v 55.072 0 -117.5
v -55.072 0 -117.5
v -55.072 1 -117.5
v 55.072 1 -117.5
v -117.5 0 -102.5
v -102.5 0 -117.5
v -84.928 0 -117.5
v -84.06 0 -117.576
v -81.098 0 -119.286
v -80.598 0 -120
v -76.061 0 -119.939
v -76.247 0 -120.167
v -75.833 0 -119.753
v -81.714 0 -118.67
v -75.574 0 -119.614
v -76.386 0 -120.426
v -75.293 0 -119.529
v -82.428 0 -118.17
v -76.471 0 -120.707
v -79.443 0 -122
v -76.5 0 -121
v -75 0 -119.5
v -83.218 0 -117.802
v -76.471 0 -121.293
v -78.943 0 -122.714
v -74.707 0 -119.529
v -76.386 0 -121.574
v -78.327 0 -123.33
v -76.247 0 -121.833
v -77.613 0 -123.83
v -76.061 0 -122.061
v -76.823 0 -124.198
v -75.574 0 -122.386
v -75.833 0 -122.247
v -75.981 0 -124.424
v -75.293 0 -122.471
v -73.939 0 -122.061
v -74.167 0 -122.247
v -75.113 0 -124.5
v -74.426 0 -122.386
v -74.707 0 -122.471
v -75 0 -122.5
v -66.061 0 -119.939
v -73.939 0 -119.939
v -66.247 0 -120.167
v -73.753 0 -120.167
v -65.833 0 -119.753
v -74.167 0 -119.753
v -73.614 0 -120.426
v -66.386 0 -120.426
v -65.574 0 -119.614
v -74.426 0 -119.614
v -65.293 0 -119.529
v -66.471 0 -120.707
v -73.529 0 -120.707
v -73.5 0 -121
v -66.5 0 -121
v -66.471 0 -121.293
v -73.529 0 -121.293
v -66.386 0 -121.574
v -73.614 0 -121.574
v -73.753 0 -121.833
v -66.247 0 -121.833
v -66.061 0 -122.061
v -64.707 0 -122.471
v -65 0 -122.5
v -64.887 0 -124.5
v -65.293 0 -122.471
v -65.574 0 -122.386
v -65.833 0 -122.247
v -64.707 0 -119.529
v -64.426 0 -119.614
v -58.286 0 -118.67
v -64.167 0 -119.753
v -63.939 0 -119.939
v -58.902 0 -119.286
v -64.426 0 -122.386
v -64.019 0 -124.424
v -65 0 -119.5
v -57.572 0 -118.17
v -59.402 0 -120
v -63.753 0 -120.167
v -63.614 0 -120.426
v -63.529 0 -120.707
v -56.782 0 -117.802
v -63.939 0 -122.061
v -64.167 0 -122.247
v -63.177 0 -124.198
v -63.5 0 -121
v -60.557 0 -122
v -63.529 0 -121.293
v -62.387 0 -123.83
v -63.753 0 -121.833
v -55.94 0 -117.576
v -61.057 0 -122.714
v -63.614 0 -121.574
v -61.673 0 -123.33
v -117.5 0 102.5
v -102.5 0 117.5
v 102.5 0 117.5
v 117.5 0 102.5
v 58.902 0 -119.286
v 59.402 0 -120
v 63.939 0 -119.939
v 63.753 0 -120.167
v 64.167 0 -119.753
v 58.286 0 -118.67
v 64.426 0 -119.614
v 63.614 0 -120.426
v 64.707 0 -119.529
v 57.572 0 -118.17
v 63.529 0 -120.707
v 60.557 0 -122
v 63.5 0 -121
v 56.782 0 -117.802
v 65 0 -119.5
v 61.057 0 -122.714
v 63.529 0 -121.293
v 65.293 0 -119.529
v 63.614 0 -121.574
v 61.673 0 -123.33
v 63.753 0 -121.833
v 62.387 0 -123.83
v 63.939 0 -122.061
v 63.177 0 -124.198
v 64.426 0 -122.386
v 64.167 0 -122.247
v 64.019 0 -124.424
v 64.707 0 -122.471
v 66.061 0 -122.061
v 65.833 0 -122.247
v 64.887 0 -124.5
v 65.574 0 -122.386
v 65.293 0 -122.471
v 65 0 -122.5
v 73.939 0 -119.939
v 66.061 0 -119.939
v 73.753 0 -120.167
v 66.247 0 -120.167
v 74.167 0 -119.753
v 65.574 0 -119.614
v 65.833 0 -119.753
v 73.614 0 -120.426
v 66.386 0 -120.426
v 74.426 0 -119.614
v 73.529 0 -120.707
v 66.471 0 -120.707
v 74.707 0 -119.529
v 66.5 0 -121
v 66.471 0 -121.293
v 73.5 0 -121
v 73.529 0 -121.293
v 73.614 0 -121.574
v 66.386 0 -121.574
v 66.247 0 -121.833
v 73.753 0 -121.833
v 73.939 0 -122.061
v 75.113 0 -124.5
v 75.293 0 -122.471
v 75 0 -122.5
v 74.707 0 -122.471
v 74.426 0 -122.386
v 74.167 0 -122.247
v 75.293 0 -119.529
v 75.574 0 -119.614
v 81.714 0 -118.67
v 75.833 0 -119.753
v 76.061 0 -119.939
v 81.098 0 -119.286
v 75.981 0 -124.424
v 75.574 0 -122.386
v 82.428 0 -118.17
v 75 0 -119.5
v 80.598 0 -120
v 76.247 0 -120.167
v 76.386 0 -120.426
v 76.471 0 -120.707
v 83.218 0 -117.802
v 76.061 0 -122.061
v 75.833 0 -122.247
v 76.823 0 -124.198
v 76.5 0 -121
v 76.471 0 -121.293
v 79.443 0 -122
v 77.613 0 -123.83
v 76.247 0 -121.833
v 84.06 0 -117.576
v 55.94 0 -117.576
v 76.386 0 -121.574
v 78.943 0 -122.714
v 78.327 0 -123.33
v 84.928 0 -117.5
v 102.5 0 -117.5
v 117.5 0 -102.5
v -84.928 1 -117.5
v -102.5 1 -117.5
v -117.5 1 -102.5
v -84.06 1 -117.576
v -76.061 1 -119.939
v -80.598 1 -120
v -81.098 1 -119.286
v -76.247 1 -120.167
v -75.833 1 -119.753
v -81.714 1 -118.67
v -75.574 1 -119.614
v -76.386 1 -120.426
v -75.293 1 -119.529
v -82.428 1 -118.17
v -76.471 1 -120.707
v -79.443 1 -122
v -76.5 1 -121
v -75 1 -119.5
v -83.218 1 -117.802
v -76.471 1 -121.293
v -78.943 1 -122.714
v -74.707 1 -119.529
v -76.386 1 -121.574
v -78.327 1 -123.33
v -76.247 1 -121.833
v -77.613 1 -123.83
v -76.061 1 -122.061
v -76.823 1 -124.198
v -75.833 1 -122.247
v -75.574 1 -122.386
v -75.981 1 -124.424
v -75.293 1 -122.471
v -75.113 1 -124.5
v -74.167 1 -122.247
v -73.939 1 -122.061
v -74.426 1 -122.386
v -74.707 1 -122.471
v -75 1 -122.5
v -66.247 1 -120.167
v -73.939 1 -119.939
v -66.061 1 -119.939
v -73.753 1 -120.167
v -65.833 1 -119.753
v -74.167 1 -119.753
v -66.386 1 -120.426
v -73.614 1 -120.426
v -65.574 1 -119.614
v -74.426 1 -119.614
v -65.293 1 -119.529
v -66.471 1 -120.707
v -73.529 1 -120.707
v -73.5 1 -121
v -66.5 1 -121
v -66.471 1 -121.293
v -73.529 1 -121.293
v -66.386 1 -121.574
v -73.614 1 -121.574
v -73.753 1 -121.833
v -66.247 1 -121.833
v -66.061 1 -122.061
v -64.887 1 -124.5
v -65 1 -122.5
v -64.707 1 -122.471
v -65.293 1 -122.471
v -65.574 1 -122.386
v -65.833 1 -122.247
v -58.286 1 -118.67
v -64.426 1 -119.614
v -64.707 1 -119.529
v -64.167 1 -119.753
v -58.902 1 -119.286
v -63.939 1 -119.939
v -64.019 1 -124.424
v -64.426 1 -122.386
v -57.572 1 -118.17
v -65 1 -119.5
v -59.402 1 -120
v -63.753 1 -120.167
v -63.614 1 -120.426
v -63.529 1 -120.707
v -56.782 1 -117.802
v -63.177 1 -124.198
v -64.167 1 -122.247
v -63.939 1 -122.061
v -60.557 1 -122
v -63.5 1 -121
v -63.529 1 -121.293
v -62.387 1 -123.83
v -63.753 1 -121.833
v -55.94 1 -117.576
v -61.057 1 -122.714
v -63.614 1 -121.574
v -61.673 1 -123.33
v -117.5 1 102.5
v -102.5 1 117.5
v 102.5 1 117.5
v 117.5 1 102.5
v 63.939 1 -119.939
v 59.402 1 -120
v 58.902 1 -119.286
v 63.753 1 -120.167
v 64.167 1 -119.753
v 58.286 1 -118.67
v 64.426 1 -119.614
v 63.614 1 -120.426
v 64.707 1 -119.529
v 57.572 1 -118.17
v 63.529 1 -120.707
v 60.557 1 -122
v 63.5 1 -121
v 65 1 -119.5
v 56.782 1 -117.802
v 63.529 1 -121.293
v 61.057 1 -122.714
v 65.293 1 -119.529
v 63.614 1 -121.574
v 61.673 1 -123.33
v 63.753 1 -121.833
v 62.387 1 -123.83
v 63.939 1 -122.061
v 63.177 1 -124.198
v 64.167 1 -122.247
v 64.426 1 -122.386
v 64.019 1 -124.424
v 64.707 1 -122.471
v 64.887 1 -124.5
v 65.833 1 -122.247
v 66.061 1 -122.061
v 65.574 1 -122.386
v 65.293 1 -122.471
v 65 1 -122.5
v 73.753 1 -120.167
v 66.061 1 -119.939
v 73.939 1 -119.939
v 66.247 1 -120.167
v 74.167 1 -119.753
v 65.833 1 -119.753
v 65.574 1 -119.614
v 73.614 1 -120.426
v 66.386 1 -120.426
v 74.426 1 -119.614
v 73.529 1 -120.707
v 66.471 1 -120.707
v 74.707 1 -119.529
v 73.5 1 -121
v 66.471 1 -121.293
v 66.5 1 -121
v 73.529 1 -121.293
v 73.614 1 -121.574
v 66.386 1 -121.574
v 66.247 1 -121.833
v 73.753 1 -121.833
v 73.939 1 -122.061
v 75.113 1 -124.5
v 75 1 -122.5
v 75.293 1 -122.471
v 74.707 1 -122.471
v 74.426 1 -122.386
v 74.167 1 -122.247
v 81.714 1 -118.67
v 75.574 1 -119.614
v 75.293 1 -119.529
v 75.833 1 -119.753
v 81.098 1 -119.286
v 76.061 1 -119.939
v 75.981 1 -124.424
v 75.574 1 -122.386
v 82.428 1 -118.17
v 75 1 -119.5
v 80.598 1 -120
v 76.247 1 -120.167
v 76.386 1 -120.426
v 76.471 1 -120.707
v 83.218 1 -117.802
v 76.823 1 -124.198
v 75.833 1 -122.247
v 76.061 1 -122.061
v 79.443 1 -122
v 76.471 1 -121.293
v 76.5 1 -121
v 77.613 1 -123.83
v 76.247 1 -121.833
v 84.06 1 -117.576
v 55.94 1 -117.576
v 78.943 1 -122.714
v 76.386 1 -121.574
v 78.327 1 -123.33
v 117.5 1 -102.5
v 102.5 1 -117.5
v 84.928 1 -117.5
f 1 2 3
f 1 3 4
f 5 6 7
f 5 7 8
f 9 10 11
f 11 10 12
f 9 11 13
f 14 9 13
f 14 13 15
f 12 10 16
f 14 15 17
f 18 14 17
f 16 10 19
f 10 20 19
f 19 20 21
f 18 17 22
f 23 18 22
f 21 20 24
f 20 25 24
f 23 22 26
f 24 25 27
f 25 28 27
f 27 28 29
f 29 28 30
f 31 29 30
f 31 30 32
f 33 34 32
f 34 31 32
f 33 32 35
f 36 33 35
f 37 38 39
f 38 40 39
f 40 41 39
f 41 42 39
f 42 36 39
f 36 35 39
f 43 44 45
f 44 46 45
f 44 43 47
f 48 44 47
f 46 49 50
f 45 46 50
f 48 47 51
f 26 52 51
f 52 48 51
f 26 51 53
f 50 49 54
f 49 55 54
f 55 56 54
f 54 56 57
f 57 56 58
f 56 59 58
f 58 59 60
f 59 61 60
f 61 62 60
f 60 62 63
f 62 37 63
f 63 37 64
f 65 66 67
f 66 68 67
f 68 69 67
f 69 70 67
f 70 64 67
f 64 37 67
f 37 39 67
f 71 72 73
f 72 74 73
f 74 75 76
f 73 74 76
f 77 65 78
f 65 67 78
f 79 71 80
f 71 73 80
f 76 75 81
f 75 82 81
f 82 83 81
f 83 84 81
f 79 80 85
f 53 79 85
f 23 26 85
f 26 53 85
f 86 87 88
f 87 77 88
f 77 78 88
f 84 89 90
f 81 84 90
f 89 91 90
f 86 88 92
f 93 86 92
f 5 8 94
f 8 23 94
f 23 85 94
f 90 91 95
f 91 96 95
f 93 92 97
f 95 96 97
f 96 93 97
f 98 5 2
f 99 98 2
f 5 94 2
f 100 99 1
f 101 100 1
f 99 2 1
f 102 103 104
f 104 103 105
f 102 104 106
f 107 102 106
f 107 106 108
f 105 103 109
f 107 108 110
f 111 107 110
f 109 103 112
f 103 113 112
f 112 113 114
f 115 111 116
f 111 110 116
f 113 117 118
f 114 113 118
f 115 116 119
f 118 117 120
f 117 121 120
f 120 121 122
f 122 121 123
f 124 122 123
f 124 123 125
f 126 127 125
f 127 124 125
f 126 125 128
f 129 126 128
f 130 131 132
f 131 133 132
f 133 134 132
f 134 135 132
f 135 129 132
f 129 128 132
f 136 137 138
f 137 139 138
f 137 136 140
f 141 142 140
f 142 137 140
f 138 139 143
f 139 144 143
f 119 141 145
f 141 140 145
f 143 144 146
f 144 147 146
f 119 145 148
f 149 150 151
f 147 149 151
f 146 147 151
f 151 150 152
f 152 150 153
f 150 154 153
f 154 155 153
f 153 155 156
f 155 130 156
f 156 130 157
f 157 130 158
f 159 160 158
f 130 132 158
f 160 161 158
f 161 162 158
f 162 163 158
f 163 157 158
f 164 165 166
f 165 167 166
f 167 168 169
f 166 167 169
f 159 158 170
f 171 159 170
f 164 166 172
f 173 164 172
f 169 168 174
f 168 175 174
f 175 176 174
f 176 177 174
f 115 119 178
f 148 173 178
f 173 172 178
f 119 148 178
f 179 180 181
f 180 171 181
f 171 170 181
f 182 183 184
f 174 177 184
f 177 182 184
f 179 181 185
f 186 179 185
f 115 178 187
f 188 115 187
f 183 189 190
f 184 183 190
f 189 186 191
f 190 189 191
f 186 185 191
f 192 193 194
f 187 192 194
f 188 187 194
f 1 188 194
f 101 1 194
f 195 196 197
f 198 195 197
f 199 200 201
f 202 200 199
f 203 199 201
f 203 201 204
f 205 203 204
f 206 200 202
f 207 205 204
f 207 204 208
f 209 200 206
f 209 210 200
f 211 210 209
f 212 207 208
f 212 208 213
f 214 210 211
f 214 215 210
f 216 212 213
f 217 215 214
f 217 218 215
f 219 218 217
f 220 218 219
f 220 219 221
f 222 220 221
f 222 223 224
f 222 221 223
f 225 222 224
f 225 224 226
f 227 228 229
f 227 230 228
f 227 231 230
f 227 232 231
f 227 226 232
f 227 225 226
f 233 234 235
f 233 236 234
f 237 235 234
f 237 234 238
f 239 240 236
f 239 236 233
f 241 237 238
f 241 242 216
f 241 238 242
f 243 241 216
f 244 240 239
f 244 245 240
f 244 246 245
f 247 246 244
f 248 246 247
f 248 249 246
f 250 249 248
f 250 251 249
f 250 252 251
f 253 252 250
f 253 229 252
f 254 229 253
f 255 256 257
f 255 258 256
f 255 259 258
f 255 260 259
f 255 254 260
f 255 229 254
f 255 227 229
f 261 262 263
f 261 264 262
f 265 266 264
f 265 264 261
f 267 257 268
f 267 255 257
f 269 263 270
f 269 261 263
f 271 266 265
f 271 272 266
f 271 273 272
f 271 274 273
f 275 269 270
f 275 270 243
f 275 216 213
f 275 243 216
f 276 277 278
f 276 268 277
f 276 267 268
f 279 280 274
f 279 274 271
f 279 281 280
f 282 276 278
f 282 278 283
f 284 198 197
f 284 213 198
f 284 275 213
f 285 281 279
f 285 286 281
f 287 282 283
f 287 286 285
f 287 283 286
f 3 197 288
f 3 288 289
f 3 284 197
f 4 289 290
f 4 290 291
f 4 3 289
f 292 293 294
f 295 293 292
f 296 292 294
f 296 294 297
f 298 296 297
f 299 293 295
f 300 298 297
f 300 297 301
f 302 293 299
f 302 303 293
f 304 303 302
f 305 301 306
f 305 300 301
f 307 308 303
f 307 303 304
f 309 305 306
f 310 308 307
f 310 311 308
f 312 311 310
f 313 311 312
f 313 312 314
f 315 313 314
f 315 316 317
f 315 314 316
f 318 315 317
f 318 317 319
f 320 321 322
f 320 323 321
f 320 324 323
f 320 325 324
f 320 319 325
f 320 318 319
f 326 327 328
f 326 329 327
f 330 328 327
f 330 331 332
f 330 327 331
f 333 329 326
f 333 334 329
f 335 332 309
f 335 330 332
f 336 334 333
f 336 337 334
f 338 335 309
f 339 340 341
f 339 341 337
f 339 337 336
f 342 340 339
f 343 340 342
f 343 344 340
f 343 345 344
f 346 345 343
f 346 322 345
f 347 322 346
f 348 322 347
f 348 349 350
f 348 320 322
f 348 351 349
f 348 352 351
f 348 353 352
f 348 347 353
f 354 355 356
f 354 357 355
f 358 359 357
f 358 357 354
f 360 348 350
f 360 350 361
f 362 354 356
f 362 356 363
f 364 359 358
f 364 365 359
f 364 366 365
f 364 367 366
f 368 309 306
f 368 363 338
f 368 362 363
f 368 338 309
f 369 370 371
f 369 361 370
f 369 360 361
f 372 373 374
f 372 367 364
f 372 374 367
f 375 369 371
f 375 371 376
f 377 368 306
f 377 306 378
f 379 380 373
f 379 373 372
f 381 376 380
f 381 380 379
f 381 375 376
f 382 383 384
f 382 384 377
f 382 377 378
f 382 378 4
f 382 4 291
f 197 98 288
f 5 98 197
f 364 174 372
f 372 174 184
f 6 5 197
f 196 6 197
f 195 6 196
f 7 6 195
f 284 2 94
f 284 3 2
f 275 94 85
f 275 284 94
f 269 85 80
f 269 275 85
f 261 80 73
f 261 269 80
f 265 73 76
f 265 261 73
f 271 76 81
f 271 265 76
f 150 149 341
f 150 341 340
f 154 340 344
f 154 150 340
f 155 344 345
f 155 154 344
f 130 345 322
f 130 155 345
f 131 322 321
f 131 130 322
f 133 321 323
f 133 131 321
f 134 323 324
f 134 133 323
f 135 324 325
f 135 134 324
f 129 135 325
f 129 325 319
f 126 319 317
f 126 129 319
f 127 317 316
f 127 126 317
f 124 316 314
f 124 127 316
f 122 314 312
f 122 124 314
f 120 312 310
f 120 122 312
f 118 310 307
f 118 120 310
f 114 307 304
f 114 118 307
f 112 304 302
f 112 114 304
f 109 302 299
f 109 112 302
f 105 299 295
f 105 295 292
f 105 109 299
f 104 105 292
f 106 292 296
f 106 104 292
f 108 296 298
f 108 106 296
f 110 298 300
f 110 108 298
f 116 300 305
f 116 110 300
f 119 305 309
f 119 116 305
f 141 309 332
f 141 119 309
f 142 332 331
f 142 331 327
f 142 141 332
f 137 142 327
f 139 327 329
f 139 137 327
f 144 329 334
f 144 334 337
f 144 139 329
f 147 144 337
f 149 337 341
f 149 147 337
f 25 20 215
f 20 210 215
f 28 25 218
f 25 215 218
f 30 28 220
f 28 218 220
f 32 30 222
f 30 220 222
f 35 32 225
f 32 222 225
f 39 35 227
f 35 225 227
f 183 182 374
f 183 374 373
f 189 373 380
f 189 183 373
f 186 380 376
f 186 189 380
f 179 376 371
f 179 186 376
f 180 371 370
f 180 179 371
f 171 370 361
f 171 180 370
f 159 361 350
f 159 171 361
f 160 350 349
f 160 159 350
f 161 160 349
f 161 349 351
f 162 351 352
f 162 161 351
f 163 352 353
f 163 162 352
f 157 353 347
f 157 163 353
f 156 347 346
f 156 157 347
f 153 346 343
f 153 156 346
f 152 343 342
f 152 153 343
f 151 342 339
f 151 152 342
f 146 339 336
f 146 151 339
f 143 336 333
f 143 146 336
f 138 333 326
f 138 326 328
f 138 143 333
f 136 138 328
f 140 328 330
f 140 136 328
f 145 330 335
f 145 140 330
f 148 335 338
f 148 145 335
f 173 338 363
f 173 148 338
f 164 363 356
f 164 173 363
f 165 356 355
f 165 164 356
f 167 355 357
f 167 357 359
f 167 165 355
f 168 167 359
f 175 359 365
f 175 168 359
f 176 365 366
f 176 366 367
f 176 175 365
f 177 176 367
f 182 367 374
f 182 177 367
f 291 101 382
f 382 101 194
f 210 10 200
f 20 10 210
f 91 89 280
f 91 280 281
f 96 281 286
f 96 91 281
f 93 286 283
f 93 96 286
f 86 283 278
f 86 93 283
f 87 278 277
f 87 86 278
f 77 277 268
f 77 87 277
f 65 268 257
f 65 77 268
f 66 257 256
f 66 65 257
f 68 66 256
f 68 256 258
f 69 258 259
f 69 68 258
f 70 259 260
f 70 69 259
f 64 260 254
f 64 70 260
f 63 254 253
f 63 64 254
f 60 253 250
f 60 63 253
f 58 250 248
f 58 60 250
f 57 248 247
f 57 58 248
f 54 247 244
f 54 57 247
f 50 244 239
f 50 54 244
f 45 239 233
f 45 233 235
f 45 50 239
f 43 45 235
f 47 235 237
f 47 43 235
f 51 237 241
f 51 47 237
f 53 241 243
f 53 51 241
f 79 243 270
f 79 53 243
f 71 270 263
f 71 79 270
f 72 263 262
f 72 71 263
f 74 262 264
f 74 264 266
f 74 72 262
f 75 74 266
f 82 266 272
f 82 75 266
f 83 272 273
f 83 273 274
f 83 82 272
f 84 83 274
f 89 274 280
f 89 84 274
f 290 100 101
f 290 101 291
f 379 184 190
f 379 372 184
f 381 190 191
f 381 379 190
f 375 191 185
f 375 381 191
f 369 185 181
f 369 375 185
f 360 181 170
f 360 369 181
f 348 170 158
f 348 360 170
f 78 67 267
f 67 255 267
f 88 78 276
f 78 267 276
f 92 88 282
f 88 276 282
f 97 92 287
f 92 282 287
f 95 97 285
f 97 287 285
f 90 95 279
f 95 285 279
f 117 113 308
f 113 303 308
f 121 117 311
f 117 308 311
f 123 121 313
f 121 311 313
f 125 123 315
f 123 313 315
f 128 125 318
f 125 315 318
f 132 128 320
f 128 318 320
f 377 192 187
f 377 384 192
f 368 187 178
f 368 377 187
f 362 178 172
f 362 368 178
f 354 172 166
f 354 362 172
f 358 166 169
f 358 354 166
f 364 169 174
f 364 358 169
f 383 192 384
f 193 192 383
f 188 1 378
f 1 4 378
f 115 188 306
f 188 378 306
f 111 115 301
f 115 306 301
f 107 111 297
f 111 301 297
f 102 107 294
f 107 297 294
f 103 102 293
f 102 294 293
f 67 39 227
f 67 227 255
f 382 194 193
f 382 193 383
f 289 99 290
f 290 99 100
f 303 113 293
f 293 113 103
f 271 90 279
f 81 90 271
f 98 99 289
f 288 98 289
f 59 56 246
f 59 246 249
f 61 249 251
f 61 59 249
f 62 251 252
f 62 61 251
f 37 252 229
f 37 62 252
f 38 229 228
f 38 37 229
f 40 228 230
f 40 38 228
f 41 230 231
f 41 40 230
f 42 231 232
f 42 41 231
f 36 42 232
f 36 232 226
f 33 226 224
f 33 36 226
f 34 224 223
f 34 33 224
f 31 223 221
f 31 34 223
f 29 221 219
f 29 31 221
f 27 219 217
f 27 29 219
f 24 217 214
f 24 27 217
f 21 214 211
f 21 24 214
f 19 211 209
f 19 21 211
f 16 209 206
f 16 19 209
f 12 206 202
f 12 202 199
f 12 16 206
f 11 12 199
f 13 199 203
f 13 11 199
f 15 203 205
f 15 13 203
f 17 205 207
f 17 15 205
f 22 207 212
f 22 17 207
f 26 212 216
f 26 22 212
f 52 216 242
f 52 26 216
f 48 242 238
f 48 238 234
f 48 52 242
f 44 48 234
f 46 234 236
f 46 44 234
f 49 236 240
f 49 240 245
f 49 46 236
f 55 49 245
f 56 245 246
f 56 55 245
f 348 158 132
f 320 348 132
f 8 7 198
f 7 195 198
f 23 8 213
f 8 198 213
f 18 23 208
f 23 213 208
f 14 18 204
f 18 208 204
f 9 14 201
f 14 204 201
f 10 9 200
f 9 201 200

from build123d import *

# Parameters (mm, degrees)
SKETCH1_W           = 235
SKETCH1_H           = 235
BOSS_EXTRUDE1_DEPTH = 1
SKETCH2_R           = 1.5
BOSS_EXTRUDE2_DEPTH = 1
FILLET1_R           = 5
CHAMFER1_SIZE       = 15


with BuildPart() as part:
    # Sketch1 → Boss-Extrude1 (new body)
    with BuildSketch(Plane(origin=(0, 0, 0), x_dir=(1, 0, 0), z_dir=(0, 1, 0))):
        Rectangle(SKETCH1_W, SKETCH1_H)
    extrude(amount=BOSS_EXTRUDE1_DEPTH)

    # Sketch2 → Boss-Extrude2 (add)
    with BuildSketch(Plane(origin=(0, 0, 0), x_dir=(1, 0, 0), z_dir=(0, 1, 0))):
        Polygon((-82.041451884, 117.5), (-78, 124.5), (-62, 124.5), (-57.958548116, 117.5), align=None)
        with Locations((-75, 121)):
            Circle(SKETCH2_R, mode=Mode.SUBTRACT)
        with Locations((-65, 121)):
            Circle(SKETCH2_R, mode=Mode.SUBTRACT)
        Polygon((57.958548116, 117.5), (82.041451884, 117.5), (78, 124.5), (62, 124.5), align=None)
        with Locations((65, 121)):
            Circle(SKETCH2_R, mode=Mode.SUBTRACT)
        with Locations((75, 121)):
            Circle(SKETCH2_R, mode=Mode.SUBTRACT)
    extrude(amount=BOSS_EXTRUDE2_DEPTH)

    # Fillet1
    fillet1_edges = [part.edges().sort_by_distance(p)[0] for p in [
        (-82.041451884, 0.5, -117.5),
        (-57.958548116, 0.5, -117.5),
        (-62, 0.5, -124.5),
        (-78, 0.5, -124.5),
        (62, 0.5, -124.5),
        (57.958548116, 0.5, -117.5),
        (82.041451884, 0.5, -117.5),
        (78, 0.5, -124.5),
    ]]
    fillet(fillet1_edges, radius=FILLET1_R)

    # Chamfer1
    chamfer1_edges = [part.edges().sort_by_distance(p)[0] for p in [
        (-117.5, 0.5, -117.5),
        (117.5, 0.5, -117.5),
        (117.5, 0.5, 117.5),
        (-117.5, 0.5, 117.5),
    ]]
    chamfer(chamfer1_edges, length=CHAMFER1_SIZE)


solid = part.part
